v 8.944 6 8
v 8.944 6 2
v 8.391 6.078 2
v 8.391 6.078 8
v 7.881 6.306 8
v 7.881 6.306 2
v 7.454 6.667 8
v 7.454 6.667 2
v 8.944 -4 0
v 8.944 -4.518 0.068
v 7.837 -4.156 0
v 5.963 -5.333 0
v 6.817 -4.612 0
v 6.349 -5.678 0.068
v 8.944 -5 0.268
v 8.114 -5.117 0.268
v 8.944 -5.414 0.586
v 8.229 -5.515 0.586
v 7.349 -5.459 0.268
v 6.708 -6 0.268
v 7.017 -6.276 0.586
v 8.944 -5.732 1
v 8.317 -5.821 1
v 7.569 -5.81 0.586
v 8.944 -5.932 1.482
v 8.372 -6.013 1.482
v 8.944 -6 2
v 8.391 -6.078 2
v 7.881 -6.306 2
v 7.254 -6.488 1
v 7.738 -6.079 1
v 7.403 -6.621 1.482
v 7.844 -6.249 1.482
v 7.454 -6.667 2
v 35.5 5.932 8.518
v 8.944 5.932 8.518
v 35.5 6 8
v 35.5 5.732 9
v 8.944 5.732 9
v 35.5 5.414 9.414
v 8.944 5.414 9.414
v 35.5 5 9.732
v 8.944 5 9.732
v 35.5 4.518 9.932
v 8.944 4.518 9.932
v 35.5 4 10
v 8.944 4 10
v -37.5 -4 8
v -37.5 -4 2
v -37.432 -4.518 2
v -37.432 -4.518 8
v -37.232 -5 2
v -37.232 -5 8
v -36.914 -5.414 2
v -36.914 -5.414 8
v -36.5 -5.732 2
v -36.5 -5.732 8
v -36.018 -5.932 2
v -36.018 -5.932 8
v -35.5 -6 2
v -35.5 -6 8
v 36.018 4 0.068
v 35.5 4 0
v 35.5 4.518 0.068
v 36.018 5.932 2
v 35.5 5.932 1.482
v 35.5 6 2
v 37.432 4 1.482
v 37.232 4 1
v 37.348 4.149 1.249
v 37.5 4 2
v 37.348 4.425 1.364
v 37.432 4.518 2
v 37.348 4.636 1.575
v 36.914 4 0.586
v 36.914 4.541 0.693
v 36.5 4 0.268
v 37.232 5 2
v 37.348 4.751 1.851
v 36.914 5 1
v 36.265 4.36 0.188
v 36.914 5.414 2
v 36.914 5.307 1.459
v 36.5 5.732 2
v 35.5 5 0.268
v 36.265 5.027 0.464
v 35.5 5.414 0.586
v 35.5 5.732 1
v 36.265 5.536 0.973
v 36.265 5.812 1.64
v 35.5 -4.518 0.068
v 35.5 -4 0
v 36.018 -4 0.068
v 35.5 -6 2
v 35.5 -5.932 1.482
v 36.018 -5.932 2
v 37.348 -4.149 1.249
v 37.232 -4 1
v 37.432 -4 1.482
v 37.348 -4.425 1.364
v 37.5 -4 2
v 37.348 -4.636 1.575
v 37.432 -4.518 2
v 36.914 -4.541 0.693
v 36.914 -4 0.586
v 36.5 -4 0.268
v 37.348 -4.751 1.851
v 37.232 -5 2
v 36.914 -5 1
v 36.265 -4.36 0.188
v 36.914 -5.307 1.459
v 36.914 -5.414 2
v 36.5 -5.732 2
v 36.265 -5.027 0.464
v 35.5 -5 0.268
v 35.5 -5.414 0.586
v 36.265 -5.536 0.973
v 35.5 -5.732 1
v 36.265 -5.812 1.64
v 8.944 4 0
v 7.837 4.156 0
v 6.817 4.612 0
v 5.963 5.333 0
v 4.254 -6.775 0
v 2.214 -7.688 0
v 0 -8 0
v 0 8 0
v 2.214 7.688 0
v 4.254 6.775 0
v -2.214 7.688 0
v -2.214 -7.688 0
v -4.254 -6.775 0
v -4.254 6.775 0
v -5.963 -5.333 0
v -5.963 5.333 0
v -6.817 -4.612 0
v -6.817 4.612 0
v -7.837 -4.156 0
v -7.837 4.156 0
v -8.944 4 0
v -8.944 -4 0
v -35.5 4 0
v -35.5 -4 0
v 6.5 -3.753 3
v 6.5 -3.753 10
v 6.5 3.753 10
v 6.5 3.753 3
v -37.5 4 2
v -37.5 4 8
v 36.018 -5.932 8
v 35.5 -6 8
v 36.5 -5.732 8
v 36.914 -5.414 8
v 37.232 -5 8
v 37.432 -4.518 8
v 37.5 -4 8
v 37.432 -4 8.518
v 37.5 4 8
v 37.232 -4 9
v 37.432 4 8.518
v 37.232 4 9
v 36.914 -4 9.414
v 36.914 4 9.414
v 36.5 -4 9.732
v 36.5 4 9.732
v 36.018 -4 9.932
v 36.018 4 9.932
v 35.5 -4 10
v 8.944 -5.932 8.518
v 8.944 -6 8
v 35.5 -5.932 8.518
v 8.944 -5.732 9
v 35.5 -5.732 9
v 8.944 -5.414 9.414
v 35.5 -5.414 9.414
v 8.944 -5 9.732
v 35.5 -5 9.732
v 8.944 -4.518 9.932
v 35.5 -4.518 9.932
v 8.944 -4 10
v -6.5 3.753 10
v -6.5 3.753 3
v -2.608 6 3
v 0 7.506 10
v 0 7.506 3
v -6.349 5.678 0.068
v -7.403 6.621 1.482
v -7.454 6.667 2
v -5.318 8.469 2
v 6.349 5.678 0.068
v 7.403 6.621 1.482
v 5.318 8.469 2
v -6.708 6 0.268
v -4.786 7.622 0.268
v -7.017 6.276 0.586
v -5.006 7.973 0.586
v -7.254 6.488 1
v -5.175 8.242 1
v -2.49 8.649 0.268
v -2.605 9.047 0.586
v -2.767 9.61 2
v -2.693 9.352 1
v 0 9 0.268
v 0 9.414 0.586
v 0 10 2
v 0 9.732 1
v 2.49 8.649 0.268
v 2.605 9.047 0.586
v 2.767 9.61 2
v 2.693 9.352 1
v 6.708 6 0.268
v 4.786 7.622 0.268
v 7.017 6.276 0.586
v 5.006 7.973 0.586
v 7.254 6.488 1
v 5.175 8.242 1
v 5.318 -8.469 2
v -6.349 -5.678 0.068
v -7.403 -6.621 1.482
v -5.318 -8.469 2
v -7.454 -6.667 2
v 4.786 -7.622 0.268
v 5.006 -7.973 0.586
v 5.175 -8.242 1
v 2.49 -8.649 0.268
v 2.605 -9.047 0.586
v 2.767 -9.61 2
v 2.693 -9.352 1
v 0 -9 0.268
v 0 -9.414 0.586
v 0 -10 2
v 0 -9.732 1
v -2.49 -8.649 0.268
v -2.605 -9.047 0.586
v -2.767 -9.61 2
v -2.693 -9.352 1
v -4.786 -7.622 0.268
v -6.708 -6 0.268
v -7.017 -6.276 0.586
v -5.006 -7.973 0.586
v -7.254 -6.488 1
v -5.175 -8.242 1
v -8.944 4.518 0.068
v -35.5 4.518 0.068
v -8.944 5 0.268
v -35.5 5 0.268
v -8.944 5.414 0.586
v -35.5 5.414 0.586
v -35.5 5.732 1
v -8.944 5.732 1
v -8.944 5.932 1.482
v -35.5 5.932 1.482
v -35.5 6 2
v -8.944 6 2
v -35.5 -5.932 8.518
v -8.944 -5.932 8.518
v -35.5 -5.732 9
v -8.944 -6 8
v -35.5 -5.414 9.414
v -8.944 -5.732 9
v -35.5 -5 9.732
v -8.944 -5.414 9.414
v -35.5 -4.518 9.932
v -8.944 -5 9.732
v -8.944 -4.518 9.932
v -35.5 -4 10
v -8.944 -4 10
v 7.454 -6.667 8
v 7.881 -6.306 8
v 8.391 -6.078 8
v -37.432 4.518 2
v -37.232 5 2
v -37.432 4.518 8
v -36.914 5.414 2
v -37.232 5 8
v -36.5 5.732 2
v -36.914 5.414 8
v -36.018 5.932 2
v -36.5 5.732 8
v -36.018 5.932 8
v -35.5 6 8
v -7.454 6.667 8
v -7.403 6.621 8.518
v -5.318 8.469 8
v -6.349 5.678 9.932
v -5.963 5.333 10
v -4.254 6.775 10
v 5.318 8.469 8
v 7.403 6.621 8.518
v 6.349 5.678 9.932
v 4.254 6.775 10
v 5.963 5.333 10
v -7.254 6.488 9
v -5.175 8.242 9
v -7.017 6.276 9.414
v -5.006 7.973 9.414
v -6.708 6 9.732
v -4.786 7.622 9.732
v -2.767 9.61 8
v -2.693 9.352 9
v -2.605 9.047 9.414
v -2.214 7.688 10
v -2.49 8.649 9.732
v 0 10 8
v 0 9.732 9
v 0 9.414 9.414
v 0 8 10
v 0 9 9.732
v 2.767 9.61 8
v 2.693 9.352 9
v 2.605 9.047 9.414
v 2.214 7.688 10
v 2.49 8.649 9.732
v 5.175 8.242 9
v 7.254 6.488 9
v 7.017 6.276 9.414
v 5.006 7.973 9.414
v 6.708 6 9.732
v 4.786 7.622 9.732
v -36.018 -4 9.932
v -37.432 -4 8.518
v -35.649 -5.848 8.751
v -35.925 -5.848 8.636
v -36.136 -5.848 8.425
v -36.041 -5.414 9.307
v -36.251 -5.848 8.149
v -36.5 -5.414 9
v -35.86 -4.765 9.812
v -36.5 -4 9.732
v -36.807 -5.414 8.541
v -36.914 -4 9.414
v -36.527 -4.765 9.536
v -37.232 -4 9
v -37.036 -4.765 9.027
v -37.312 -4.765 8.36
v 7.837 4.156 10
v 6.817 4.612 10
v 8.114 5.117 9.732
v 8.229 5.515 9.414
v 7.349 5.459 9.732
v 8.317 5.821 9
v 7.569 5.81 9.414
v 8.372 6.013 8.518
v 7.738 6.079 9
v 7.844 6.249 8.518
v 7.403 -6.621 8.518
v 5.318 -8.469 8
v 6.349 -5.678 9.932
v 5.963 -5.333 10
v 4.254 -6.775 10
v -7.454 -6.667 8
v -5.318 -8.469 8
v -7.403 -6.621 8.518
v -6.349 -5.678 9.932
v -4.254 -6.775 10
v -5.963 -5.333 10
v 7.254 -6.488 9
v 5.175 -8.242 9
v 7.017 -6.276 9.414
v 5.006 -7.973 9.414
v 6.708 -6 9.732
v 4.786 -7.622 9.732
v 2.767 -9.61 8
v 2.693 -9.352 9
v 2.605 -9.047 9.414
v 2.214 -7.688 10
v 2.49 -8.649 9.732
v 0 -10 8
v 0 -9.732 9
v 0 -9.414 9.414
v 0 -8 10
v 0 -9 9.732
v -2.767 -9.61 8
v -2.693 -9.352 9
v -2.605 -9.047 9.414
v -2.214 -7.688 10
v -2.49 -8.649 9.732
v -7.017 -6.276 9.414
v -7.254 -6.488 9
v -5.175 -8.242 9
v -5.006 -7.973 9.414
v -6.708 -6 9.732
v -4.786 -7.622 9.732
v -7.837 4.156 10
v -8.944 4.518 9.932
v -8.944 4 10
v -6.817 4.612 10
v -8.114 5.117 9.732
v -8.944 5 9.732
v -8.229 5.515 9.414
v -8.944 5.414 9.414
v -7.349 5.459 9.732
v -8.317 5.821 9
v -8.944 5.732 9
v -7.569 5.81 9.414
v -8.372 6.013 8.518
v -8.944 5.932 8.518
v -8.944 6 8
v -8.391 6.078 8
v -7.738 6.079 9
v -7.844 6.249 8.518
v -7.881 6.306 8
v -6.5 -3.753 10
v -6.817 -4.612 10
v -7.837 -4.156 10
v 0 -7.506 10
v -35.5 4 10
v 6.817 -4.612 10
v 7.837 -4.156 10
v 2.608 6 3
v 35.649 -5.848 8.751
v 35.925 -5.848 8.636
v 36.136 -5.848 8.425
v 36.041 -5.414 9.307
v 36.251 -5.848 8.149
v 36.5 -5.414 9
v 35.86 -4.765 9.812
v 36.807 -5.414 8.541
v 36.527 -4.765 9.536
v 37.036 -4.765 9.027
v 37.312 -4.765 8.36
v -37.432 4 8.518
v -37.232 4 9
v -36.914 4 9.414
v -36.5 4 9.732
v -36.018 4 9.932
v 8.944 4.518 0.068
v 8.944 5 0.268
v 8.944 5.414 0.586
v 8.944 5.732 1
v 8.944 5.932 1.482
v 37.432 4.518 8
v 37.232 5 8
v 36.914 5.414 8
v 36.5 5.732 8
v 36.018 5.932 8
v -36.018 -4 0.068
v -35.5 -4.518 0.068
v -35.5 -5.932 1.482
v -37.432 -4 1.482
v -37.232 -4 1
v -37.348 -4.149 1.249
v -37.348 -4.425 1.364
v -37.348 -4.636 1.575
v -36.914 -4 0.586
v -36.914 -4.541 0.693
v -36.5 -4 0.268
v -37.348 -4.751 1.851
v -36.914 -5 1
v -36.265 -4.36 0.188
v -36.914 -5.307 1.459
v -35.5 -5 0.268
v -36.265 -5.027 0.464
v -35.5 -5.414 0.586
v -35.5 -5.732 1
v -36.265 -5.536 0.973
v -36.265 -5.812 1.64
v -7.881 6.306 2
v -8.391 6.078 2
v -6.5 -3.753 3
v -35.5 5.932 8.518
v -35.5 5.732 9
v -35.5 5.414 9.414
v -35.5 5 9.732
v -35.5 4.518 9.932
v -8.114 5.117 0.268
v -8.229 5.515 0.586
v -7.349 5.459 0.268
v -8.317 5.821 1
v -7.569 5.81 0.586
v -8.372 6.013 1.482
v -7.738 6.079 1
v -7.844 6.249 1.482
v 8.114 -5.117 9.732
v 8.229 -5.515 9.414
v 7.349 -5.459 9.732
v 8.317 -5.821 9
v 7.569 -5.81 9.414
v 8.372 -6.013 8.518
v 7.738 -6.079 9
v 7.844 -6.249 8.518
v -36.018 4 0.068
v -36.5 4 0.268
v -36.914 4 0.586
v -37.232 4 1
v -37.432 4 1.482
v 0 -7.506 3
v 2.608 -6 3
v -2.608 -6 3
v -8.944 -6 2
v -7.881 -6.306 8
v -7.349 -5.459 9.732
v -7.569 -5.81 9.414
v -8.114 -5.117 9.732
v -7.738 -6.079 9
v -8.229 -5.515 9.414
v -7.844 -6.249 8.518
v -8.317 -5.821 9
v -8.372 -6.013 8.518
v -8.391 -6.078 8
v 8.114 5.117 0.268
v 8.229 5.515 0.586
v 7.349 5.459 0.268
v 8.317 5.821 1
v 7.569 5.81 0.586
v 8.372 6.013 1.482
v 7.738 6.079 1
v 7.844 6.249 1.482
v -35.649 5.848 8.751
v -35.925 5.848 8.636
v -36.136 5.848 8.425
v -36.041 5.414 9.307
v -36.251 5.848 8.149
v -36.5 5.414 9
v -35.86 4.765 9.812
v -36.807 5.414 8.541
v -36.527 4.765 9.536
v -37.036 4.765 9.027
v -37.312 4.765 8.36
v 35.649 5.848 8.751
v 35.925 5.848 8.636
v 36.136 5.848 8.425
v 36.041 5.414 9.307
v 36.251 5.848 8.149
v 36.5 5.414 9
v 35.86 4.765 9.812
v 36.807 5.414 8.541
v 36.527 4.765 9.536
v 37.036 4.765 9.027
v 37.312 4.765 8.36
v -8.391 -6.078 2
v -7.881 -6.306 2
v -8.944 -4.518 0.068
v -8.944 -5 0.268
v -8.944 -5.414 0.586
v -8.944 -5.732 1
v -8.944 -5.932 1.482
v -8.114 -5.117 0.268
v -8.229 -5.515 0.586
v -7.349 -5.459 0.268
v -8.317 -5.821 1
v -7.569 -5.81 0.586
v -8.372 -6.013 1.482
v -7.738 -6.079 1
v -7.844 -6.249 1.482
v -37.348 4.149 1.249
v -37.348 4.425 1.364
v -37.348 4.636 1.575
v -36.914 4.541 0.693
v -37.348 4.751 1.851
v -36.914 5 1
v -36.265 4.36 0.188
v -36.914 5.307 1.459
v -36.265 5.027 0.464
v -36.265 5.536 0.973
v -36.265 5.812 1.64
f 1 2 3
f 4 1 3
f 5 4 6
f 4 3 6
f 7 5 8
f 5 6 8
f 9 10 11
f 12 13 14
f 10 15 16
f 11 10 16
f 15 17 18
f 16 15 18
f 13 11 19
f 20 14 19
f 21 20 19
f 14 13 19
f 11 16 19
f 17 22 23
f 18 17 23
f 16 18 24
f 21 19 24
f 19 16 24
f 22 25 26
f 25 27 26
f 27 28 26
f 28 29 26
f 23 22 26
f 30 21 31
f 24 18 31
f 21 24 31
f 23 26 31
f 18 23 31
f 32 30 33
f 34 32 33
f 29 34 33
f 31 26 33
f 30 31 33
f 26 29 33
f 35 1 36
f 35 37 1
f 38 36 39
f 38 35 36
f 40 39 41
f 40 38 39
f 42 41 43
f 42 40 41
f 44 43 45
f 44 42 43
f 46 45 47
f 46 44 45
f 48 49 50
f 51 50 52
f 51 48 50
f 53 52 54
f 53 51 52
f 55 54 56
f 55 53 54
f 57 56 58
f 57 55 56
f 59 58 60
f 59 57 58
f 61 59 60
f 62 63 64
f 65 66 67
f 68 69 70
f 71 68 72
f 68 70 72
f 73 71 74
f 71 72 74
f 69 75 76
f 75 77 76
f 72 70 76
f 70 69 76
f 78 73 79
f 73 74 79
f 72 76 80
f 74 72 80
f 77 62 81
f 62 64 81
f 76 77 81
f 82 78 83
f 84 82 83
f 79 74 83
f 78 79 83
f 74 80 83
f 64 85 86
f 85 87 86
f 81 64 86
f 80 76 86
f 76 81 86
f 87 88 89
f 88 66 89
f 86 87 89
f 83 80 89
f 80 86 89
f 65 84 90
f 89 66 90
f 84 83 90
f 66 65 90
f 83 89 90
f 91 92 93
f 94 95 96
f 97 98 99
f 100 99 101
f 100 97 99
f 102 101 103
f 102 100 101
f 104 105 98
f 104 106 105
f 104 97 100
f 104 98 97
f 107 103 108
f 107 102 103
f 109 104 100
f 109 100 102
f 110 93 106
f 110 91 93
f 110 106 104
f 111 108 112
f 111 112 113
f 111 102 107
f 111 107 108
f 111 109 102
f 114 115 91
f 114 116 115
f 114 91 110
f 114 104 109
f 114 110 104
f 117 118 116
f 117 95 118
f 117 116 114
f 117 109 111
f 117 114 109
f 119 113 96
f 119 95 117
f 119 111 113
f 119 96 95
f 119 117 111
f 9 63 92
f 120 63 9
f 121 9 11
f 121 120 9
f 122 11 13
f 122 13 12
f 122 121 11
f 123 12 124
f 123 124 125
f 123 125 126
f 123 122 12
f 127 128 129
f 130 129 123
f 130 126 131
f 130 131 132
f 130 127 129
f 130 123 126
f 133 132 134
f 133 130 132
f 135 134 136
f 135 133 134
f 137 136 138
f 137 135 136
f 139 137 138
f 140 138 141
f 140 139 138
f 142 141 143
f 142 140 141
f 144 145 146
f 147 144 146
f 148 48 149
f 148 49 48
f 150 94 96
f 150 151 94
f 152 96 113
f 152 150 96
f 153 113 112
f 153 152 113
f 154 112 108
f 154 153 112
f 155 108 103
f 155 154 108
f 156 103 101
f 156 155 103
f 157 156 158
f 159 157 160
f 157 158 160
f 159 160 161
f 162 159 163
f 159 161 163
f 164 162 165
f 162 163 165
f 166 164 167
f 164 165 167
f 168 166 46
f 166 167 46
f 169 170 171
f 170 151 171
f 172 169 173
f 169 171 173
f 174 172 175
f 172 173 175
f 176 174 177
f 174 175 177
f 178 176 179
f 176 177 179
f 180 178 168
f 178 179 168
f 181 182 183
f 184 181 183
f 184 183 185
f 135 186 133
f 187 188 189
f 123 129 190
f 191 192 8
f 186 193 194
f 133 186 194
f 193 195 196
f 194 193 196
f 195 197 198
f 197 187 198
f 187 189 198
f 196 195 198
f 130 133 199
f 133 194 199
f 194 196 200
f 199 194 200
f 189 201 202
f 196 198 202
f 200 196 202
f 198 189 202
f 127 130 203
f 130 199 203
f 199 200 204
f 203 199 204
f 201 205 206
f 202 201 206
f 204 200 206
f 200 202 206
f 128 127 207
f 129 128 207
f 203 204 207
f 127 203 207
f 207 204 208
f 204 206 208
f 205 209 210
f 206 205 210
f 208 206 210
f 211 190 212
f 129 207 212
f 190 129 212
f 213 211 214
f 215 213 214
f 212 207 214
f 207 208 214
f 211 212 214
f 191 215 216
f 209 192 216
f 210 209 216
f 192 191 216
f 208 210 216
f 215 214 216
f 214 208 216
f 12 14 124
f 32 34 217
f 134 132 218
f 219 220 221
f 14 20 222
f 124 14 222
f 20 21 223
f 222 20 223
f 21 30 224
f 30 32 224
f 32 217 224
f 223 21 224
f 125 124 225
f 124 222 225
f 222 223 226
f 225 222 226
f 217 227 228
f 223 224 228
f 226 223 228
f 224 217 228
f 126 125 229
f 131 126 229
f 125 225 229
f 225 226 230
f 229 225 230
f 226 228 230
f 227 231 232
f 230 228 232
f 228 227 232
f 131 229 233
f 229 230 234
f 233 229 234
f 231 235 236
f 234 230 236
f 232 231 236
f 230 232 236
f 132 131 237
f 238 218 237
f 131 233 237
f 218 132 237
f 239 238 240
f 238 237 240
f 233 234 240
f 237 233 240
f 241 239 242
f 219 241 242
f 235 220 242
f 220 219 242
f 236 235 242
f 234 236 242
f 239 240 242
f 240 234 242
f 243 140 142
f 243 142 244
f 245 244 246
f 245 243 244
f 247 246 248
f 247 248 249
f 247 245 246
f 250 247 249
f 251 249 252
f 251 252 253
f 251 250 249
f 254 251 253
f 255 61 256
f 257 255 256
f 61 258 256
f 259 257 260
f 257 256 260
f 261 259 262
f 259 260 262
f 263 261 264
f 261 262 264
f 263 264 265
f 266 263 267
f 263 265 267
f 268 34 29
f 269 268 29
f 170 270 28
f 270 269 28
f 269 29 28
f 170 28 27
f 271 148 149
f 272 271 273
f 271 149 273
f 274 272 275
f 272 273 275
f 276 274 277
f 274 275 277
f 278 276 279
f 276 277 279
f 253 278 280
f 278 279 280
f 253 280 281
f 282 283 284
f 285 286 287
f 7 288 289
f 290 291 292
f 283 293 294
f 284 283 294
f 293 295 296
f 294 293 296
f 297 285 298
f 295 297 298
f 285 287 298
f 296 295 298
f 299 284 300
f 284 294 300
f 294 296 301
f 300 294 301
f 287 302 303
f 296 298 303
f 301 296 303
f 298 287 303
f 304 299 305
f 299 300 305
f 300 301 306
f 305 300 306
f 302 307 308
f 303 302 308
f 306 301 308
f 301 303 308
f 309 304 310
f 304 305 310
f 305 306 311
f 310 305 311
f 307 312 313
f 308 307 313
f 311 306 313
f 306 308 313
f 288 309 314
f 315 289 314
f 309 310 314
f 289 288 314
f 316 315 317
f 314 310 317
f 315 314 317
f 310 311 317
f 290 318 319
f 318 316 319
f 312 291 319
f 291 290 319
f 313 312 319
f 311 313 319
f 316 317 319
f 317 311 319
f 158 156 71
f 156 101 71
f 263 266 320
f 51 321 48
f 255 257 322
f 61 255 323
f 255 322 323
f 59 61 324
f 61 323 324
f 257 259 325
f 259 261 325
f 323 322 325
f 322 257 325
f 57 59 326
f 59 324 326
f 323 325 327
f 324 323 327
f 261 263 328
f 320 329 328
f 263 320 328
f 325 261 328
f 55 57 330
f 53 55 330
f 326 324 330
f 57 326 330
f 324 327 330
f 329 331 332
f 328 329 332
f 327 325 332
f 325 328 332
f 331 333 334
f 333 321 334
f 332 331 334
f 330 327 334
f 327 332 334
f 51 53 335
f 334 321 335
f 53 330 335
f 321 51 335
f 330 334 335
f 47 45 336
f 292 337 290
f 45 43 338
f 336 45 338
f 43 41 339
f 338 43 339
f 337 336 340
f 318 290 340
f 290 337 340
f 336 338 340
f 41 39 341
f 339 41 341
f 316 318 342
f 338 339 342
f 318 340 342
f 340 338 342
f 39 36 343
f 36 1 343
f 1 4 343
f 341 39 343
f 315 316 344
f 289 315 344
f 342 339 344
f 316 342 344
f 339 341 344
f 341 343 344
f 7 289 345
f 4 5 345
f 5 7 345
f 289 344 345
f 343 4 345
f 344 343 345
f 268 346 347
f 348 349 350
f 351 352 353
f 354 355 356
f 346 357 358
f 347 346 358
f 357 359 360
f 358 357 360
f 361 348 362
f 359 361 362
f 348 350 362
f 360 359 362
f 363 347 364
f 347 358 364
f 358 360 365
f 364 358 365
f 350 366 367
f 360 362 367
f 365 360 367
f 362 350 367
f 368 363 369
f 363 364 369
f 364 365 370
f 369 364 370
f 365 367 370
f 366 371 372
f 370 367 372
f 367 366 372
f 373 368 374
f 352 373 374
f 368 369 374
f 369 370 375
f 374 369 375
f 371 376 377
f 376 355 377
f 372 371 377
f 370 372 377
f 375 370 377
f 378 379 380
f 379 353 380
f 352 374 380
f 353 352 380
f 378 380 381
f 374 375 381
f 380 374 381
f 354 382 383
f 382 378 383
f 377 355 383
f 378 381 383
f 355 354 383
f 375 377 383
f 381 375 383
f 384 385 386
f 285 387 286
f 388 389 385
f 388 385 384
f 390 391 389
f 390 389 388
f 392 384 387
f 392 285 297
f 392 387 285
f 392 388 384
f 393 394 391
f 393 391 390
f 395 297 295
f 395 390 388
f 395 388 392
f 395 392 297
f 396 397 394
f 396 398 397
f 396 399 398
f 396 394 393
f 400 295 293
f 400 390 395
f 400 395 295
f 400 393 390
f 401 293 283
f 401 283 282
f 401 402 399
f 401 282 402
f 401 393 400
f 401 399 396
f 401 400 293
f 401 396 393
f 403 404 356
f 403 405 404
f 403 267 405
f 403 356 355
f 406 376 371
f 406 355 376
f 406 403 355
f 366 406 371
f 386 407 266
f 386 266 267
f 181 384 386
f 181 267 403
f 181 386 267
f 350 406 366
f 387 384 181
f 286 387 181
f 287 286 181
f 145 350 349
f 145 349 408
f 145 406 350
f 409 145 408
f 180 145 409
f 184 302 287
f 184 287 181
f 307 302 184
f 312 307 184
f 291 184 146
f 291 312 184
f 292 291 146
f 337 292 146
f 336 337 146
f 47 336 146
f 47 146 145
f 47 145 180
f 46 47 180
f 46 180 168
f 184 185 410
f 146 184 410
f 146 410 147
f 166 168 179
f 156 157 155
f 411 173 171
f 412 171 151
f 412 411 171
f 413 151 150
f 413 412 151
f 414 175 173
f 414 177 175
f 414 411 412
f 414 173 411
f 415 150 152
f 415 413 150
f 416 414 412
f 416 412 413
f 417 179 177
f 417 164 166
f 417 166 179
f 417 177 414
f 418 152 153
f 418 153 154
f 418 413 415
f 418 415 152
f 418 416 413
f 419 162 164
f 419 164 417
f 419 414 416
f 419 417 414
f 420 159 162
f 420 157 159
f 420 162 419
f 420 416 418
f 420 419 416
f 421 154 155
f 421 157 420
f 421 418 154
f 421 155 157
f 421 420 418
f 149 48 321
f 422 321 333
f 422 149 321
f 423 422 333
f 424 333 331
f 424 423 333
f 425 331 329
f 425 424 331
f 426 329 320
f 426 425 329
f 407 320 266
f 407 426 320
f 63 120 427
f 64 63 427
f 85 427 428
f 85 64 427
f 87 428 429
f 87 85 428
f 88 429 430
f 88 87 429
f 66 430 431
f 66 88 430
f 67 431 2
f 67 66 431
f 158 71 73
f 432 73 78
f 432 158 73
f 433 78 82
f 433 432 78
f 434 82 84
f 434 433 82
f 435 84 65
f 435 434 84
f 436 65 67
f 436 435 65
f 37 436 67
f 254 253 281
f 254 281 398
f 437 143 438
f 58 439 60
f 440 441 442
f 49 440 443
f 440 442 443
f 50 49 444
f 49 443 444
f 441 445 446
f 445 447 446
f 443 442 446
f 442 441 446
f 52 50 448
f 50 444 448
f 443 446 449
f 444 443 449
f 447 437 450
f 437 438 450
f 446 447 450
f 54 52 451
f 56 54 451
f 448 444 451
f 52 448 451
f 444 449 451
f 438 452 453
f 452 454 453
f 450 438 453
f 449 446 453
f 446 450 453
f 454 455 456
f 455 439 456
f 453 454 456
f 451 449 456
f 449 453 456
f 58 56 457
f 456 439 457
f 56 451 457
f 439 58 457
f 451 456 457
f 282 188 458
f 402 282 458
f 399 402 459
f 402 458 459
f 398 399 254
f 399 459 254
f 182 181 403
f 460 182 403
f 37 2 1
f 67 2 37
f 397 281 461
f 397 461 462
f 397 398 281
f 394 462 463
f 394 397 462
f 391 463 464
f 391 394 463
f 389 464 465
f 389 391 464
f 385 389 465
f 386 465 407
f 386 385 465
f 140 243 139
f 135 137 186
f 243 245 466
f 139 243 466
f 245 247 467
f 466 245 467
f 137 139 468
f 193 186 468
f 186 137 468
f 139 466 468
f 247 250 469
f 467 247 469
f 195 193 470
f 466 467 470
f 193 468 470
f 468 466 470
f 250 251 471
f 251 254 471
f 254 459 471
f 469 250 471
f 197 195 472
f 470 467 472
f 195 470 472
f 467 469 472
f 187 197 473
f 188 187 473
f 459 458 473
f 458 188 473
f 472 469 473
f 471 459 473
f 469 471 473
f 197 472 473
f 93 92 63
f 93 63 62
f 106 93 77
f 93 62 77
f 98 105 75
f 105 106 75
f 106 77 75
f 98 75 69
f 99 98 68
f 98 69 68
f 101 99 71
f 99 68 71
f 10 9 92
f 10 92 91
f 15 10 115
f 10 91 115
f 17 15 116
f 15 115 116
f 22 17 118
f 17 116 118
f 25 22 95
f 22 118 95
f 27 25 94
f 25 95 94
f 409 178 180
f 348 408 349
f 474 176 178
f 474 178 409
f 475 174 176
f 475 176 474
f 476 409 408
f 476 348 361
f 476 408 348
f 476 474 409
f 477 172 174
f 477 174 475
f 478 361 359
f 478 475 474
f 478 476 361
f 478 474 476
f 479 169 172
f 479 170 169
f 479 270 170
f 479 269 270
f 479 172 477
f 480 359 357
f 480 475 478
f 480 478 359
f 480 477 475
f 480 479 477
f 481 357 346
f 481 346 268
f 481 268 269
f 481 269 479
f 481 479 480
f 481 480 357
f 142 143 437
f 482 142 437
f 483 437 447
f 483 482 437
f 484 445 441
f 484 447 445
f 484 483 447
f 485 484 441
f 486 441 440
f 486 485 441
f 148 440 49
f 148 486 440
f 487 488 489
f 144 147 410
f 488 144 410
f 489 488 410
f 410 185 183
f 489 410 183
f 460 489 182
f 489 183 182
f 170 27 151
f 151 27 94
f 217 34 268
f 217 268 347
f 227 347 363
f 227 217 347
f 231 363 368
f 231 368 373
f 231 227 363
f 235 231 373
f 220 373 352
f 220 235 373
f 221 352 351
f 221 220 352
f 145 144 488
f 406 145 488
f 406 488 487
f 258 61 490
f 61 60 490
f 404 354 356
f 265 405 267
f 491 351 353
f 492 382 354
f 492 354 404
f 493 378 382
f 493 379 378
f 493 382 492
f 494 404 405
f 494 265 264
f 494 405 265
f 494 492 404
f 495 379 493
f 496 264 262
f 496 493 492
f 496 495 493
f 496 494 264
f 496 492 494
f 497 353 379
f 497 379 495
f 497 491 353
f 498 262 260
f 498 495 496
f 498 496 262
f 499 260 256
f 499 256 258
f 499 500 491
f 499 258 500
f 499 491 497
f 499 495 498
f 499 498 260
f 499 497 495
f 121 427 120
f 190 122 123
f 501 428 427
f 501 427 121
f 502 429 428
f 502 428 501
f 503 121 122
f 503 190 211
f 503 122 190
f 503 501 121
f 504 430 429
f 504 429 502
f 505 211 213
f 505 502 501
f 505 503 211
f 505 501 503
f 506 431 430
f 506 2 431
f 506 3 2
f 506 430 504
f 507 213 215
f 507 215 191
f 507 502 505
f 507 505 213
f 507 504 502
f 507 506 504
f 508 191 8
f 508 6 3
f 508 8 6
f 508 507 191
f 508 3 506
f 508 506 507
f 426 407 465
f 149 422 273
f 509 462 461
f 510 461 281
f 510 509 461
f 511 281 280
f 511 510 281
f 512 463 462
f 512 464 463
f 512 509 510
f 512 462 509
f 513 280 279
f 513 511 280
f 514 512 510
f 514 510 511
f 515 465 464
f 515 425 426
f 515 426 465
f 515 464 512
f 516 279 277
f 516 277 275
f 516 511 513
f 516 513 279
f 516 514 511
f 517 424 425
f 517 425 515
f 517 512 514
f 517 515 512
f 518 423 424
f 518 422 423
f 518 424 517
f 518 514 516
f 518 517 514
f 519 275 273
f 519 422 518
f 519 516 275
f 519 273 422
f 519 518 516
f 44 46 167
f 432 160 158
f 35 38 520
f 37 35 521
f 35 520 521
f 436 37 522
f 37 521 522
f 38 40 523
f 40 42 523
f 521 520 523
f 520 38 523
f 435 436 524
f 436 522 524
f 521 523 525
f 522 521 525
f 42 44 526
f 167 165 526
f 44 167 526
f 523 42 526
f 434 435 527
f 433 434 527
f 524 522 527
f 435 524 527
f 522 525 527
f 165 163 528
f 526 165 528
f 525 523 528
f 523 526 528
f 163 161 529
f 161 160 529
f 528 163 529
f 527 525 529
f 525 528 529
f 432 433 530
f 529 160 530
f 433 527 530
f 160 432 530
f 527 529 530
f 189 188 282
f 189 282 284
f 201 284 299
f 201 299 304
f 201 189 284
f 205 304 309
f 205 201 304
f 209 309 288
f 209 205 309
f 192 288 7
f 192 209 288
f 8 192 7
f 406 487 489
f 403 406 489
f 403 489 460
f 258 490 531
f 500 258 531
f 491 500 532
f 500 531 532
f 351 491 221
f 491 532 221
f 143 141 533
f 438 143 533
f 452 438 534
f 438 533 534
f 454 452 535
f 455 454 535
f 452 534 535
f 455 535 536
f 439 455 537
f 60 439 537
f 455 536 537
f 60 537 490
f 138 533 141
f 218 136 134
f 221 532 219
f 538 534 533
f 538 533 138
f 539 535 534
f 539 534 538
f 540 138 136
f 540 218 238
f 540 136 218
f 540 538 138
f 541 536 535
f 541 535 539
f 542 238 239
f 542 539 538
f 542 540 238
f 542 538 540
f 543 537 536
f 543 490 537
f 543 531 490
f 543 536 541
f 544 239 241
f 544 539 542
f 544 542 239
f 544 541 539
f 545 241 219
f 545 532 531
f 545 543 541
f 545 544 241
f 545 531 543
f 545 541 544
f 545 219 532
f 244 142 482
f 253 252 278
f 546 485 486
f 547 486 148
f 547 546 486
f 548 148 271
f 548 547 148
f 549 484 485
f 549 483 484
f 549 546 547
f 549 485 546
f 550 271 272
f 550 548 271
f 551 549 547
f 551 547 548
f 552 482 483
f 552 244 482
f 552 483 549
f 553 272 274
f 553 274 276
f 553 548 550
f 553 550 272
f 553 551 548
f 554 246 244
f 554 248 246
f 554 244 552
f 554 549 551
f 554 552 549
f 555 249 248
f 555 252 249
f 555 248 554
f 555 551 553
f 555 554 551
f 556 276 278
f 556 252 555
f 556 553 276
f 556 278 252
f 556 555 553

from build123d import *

# Parameters (mm, degrees)
SKETCH1_W           = 75
SKETCH1_H           = 12
BOSS_EXTRUDE1_DEPTH = 10
CUT_EXTRUDE1_DEPTH  = 7
SKETCH3_R           = 10
BOSS_EXTRUDE2_DEPTH = 10
BOSS_EXTRUDE3_DEPTH = 3
FILLET1_R           = 2


with BuildPart() as part:
    # Sketch1 → Boss-Extrude1 (new body)
    with BuildSketch(Plane.XY):
        Rectangle(SKETCH1_W, SKETCH1_H)
    extrude(amount=BOSS_EXTRUDE1_DEPTH)

    # Sketch2 → Cut-Extrude1 (cut)
    with BuildSketch(Plane.XY.offset(10)):
        Polygon((0, -7.505553499), (6.5, -3.75277675), (6.5, 3.75277675), (0, 7.505553499), (-6.5, 3.75277675), (-6.5, -3.75277675), align=None)
    extrude(amount=-CUT_EXTRUDE1_DEPTH, mode=Mode.SUBTRACT)

    # Sketch3 → Boss-Extrude2 (add)
    with BuildSketch(Plane(origin=(0, 0, 0), x_dir=(-1, 0, 0), z_dir=(0, 0, -1))):
        Circle(SKETCH3_R)
        Polygon((0, -7.505553499), (6.5, -3.75277675), (6.5, 3.75277675), (0, 7.505553499), (-6.5, 3.75277675), (-6.5, -3.75277675), align=None, mode=Mode.SUBTRACT)
    extrude(amount=-BOSS_EXTRUDE2_DEPTH)

    # Sketch4 → Boss-Extrude3 (add)
    with BuildSketch(Plane(origin=(0, 0, 0), x_dir=(-1, 0, 0), z_dir=(0, 0, -1))):
        Polygon((2.607695155, 6), (0, 7.505553499), (-2.607695155, 6), align=None)
        Polygon((0, -7.505553499), (2.607695155, -6), (-2.607695155, -6), align=None)
    extrude(amount=-BOSS_EXTRUDE3_DEPTH)

    # Fillet1
    fillet1_edges = [part.edges().sort_by_distance(p)[0] for p in [
        (-37.5, 0, 10),
        (-22.75, -6, 10),
        (37.5, 0, 10),
        (-22.75, -6, 0),
        (22.75, -6, 0),
        (-22.75, 6, 0),
        (-37.5, 0, 0),
        (22.75, -6, 10),
        (22.75, 6, 0),
        (-22.75, 6, 10),
        (0, 10, 0),
        (0, -10, 0),
        (0, 10, 10),
        (37.5, 0, 0),
        (-8, 6, 5),
        (-8, -6, 5),
        (0, -10, 10),
        (8, 6, 5),
        (8, -6, 5),
        (22.75, 6, 10),
        (37.5, -6, 5),
        (-37.5, -6, 5),
        (-37.5, 6, 5),
        (37.5, 6, 5),
    ]]
    fillet(fillet1_edges, radius=FILLET1_R)


solid = part.part
